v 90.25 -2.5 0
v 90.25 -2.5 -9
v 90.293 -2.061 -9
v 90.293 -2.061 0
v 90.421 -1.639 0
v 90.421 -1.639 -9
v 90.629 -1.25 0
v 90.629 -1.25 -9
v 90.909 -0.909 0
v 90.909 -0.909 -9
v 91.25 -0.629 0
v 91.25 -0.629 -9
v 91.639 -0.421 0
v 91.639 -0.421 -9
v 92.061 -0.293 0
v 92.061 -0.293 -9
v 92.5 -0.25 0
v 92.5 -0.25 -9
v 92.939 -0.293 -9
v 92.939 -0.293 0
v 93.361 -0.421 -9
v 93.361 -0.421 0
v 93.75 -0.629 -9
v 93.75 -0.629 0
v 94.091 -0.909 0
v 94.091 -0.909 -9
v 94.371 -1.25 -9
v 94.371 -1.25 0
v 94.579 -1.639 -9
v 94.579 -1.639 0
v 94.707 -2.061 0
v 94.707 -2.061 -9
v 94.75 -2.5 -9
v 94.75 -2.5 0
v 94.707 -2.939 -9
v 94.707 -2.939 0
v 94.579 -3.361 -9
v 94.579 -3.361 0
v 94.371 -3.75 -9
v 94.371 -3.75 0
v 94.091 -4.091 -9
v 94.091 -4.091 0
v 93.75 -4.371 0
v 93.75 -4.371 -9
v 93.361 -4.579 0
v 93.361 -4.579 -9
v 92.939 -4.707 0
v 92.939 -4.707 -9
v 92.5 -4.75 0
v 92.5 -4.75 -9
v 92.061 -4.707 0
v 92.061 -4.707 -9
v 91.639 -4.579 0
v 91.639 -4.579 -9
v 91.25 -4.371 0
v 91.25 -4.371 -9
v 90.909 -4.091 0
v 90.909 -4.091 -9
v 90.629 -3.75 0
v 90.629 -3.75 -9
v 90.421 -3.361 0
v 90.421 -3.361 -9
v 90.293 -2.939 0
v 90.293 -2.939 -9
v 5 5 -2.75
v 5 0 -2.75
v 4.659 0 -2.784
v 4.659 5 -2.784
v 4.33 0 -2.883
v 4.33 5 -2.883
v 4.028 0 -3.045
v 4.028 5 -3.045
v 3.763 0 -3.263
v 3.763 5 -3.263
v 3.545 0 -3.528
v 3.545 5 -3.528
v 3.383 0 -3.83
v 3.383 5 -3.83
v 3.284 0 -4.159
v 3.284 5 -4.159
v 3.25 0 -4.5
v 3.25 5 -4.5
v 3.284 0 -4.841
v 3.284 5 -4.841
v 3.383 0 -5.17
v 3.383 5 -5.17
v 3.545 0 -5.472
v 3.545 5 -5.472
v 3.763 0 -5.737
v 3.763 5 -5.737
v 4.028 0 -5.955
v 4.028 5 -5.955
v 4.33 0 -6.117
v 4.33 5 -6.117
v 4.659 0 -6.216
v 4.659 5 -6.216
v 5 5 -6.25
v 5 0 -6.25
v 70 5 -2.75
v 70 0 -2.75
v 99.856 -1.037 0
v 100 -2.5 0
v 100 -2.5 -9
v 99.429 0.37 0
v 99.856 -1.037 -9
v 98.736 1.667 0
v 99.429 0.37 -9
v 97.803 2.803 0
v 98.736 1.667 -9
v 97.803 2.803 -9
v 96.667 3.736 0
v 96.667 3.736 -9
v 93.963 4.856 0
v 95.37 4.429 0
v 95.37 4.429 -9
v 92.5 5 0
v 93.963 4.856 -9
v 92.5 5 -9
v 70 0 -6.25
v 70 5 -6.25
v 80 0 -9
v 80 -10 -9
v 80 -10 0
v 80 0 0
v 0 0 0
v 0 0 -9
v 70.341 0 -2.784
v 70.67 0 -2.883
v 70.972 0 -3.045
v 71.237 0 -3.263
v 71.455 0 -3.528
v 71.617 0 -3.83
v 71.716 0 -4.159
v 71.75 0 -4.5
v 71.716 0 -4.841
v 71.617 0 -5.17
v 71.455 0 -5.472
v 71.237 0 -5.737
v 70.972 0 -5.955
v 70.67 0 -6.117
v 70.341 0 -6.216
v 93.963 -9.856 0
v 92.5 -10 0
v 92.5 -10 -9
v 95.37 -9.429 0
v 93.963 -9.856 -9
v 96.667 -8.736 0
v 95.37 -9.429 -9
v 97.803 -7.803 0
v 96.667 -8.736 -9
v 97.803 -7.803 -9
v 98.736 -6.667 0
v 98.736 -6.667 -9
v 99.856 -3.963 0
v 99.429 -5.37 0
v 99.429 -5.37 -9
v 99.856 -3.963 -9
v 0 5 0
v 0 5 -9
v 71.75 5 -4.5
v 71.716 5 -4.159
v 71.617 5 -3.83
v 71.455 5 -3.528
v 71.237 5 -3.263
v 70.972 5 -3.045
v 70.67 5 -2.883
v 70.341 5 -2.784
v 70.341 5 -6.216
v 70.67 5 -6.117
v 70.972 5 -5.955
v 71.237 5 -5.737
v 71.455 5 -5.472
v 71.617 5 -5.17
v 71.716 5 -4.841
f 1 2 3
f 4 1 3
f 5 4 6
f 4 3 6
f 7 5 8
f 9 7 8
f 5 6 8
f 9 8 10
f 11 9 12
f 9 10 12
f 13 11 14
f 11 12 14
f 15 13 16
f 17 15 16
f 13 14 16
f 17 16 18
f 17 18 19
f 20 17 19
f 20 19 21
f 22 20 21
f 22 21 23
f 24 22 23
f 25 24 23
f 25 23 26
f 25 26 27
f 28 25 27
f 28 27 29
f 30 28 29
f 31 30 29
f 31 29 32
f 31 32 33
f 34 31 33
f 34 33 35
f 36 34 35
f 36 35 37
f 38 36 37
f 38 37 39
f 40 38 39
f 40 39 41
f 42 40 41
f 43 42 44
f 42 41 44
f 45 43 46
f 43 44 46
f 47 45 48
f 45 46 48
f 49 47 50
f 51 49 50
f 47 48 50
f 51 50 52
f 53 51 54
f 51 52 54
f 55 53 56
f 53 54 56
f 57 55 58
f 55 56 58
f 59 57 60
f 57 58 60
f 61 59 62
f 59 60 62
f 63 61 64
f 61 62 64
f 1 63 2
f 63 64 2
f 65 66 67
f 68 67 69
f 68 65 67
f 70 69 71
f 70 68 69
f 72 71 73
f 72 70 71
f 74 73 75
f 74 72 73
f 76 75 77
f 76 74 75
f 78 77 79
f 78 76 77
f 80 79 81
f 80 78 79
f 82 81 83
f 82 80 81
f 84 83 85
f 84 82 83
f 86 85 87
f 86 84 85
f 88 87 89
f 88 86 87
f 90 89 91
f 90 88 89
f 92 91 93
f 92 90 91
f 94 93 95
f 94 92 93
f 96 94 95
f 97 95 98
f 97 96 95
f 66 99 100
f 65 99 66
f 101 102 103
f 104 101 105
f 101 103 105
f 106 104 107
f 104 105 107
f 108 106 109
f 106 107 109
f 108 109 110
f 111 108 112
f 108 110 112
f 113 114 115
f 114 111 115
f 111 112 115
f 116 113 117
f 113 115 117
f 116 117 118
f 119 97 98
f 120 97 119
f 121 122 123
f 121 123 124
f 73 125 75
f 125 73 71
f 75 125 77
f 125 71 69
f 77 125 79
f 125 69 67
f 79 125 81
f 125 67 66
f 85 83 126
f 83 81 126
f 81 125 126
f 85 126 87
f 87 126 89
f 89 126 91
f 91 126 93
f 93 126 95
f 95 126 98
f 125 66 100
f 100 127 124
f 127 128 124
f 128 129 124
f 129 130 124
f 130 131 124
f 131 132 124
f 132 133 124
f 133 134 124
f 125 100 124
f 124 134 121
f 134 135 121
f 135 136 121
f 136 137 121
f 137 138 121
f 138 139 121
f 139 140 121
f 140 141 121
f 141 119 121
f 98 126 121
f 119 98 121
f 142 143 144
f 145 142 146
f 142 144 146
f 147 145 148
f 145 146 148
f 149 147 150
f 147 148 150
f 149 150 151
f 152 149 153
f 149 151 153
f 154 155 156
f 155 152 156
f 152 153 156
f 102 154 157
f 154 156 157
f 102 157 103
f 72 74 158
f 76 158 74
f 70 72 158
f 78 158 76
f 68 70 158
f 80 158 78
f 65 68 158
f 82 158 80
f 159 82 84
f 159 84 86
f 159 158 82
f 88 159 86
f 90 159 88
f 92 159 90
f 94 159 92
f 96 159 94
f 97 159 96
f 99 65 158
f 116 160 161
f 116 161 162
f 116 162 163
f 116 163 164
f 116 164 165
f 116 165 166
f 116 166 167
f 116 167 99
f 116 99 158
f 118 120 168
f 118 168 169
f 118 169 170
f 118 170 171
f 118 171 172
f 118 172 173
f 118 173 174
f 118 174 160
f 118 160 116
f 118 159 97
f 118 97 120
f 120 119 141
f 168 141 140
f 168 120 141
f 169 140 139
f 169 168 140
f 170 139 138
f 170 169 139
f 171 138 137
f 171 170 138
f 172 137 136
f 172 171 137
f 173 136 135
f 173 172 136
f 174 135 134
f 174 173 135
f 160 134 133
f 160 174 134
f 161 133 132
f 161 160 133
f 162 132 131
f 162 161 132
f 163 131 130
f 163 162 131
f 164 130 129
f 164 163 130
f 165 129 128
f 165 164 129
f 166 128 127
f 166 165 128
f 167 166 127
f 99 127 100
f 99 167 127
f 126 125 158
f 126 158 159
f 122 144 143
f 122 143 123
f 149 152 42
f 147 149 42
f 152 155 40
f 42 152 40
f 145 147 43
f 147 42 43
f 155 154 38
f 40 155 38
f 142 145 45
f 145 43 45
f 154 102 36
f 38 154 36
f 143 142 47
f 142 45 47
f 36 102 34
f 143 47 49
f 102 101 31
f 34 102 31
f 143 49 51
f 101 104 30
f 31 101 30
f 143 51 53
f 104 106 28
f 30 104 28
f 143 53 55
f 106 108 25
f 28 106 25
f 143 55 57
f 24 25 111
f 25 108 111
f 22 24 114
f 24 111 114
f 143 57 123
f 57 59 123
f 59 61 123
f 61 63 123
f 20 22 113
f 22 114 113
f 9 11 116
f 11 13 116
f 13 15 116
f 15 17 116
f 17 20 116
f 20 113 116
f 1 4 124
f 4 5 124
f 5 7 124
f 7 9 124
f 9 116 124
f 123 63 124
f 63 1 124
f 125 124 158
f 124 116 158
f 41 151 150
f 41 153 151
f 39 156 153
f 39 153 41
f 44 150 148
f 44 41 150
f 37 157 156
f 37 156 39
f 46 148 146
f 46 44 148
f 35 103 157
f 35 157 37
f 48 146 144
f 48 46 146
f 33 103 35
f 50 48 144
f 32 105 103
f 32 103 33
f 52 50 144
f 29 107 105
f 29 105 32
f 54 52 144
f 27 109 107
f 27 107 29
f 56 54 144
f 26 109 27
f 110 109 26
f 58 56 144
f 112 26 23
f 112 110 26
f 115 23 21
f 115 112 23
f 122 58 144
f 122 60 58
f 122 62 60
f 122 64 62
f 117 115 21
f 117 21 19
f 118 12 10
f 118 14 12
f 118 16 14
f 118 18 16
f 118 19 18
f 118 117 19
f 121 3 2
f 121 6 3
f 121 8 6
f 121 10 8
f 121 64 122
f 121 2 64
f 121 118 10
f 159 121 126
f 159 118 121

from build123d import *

# Parameters (mm, degrees)
SKETCH1_W           = 100
SKETCH1_H           = 9
BOSS_EXTRUDE1_DEPTH = 5
CUT_EXTRUDE1_DEPTH  = 6
SKETCH3_W           = 20
SKETCH3_H           = 15
BOSS_EXTRUDE2_DEPTH = 9
SKETCH4_R           = 2.25
CUT_EXTRUDE2_DEPTH  = 10


with BuildPart() as part:
    # Sketch1 → Boss-Extrude1 (new body)
    with BuildSketch(Plane(origin=(0, 0, 0), x_dir=(1, 0, 0), z_dir=(0, 1, 0))):
        with Locations((50, 4.5)):
            Rectangle(SKETCH1_W, SKETCH1_H)
    extrude(amount=BOSS_EXTRUDE1_DEPTH)

    # Sketch2 → Cut-Extrude1 (cut, through all)
    with BuildSketch(Plane(origin=(0, 5, 0), x_dir=(1, 0, 0), z_dir=(0, 1, 0))):
        with BuildLine():
            Line((5, 6.25), (70, 6.25))
            ThreePointArc((70, 6.25), (71.75, 4.5), (70, 2.75))
            Line((70, 2.75), (5, 2.75))
            ThreePointArc((5, 2.75), (3.25, 4.5), (5, 6.25))
        make_face()
    extrude(amount=-CUT_EXTRUDE1_DEPTH, mode=Mode.SUBTRACT)

    # Sketch3 → Boss-Extrude2 (add)
    with BuildSketch(Plane(origin=(0, 0, -9), x_dir=(-1, 0, 0), z_dir=(0, 0, -1))):
        with Locations((-90, -2.5)):
            Rectangle(SKETCH3_W, SKETCH3_H)
    extrude(amount=-BOSS_EXTRUDE2_DEPTH)

    # Sketch4 → Cut-Extrude2 (cut)
    with BuildSketch(Plane(origin=(0, 0, -9), x_dir=(-1, 0, 0), z_dir=(0, 0, -1))):
        with BuildLine():
            Line((-100, 5), (-100, -2.5))
            ThreePointArc((-100, -2.5), (-97.803300859, 2.803300859), (-92.5, 5))
            Line((-92.5, 5), (-100, 5))
        make_face()
        with BuildLine():
            Line((-100, -10), (-92.5, -10))
            ThreePointArc((-92.5, -10), (-97.803300859, -7.803300859), (-100, -2.5))
            Line((-100, -2.5), (-100, -10))
        make_face()
        with Locations((-92.5, -2.5)):
            Circle(SKETCH4_R)
    extrude(amount=-CUT_EXTRUDE2_DEPTH, mode=Mode.SUBTRACT)


solid = part.part
